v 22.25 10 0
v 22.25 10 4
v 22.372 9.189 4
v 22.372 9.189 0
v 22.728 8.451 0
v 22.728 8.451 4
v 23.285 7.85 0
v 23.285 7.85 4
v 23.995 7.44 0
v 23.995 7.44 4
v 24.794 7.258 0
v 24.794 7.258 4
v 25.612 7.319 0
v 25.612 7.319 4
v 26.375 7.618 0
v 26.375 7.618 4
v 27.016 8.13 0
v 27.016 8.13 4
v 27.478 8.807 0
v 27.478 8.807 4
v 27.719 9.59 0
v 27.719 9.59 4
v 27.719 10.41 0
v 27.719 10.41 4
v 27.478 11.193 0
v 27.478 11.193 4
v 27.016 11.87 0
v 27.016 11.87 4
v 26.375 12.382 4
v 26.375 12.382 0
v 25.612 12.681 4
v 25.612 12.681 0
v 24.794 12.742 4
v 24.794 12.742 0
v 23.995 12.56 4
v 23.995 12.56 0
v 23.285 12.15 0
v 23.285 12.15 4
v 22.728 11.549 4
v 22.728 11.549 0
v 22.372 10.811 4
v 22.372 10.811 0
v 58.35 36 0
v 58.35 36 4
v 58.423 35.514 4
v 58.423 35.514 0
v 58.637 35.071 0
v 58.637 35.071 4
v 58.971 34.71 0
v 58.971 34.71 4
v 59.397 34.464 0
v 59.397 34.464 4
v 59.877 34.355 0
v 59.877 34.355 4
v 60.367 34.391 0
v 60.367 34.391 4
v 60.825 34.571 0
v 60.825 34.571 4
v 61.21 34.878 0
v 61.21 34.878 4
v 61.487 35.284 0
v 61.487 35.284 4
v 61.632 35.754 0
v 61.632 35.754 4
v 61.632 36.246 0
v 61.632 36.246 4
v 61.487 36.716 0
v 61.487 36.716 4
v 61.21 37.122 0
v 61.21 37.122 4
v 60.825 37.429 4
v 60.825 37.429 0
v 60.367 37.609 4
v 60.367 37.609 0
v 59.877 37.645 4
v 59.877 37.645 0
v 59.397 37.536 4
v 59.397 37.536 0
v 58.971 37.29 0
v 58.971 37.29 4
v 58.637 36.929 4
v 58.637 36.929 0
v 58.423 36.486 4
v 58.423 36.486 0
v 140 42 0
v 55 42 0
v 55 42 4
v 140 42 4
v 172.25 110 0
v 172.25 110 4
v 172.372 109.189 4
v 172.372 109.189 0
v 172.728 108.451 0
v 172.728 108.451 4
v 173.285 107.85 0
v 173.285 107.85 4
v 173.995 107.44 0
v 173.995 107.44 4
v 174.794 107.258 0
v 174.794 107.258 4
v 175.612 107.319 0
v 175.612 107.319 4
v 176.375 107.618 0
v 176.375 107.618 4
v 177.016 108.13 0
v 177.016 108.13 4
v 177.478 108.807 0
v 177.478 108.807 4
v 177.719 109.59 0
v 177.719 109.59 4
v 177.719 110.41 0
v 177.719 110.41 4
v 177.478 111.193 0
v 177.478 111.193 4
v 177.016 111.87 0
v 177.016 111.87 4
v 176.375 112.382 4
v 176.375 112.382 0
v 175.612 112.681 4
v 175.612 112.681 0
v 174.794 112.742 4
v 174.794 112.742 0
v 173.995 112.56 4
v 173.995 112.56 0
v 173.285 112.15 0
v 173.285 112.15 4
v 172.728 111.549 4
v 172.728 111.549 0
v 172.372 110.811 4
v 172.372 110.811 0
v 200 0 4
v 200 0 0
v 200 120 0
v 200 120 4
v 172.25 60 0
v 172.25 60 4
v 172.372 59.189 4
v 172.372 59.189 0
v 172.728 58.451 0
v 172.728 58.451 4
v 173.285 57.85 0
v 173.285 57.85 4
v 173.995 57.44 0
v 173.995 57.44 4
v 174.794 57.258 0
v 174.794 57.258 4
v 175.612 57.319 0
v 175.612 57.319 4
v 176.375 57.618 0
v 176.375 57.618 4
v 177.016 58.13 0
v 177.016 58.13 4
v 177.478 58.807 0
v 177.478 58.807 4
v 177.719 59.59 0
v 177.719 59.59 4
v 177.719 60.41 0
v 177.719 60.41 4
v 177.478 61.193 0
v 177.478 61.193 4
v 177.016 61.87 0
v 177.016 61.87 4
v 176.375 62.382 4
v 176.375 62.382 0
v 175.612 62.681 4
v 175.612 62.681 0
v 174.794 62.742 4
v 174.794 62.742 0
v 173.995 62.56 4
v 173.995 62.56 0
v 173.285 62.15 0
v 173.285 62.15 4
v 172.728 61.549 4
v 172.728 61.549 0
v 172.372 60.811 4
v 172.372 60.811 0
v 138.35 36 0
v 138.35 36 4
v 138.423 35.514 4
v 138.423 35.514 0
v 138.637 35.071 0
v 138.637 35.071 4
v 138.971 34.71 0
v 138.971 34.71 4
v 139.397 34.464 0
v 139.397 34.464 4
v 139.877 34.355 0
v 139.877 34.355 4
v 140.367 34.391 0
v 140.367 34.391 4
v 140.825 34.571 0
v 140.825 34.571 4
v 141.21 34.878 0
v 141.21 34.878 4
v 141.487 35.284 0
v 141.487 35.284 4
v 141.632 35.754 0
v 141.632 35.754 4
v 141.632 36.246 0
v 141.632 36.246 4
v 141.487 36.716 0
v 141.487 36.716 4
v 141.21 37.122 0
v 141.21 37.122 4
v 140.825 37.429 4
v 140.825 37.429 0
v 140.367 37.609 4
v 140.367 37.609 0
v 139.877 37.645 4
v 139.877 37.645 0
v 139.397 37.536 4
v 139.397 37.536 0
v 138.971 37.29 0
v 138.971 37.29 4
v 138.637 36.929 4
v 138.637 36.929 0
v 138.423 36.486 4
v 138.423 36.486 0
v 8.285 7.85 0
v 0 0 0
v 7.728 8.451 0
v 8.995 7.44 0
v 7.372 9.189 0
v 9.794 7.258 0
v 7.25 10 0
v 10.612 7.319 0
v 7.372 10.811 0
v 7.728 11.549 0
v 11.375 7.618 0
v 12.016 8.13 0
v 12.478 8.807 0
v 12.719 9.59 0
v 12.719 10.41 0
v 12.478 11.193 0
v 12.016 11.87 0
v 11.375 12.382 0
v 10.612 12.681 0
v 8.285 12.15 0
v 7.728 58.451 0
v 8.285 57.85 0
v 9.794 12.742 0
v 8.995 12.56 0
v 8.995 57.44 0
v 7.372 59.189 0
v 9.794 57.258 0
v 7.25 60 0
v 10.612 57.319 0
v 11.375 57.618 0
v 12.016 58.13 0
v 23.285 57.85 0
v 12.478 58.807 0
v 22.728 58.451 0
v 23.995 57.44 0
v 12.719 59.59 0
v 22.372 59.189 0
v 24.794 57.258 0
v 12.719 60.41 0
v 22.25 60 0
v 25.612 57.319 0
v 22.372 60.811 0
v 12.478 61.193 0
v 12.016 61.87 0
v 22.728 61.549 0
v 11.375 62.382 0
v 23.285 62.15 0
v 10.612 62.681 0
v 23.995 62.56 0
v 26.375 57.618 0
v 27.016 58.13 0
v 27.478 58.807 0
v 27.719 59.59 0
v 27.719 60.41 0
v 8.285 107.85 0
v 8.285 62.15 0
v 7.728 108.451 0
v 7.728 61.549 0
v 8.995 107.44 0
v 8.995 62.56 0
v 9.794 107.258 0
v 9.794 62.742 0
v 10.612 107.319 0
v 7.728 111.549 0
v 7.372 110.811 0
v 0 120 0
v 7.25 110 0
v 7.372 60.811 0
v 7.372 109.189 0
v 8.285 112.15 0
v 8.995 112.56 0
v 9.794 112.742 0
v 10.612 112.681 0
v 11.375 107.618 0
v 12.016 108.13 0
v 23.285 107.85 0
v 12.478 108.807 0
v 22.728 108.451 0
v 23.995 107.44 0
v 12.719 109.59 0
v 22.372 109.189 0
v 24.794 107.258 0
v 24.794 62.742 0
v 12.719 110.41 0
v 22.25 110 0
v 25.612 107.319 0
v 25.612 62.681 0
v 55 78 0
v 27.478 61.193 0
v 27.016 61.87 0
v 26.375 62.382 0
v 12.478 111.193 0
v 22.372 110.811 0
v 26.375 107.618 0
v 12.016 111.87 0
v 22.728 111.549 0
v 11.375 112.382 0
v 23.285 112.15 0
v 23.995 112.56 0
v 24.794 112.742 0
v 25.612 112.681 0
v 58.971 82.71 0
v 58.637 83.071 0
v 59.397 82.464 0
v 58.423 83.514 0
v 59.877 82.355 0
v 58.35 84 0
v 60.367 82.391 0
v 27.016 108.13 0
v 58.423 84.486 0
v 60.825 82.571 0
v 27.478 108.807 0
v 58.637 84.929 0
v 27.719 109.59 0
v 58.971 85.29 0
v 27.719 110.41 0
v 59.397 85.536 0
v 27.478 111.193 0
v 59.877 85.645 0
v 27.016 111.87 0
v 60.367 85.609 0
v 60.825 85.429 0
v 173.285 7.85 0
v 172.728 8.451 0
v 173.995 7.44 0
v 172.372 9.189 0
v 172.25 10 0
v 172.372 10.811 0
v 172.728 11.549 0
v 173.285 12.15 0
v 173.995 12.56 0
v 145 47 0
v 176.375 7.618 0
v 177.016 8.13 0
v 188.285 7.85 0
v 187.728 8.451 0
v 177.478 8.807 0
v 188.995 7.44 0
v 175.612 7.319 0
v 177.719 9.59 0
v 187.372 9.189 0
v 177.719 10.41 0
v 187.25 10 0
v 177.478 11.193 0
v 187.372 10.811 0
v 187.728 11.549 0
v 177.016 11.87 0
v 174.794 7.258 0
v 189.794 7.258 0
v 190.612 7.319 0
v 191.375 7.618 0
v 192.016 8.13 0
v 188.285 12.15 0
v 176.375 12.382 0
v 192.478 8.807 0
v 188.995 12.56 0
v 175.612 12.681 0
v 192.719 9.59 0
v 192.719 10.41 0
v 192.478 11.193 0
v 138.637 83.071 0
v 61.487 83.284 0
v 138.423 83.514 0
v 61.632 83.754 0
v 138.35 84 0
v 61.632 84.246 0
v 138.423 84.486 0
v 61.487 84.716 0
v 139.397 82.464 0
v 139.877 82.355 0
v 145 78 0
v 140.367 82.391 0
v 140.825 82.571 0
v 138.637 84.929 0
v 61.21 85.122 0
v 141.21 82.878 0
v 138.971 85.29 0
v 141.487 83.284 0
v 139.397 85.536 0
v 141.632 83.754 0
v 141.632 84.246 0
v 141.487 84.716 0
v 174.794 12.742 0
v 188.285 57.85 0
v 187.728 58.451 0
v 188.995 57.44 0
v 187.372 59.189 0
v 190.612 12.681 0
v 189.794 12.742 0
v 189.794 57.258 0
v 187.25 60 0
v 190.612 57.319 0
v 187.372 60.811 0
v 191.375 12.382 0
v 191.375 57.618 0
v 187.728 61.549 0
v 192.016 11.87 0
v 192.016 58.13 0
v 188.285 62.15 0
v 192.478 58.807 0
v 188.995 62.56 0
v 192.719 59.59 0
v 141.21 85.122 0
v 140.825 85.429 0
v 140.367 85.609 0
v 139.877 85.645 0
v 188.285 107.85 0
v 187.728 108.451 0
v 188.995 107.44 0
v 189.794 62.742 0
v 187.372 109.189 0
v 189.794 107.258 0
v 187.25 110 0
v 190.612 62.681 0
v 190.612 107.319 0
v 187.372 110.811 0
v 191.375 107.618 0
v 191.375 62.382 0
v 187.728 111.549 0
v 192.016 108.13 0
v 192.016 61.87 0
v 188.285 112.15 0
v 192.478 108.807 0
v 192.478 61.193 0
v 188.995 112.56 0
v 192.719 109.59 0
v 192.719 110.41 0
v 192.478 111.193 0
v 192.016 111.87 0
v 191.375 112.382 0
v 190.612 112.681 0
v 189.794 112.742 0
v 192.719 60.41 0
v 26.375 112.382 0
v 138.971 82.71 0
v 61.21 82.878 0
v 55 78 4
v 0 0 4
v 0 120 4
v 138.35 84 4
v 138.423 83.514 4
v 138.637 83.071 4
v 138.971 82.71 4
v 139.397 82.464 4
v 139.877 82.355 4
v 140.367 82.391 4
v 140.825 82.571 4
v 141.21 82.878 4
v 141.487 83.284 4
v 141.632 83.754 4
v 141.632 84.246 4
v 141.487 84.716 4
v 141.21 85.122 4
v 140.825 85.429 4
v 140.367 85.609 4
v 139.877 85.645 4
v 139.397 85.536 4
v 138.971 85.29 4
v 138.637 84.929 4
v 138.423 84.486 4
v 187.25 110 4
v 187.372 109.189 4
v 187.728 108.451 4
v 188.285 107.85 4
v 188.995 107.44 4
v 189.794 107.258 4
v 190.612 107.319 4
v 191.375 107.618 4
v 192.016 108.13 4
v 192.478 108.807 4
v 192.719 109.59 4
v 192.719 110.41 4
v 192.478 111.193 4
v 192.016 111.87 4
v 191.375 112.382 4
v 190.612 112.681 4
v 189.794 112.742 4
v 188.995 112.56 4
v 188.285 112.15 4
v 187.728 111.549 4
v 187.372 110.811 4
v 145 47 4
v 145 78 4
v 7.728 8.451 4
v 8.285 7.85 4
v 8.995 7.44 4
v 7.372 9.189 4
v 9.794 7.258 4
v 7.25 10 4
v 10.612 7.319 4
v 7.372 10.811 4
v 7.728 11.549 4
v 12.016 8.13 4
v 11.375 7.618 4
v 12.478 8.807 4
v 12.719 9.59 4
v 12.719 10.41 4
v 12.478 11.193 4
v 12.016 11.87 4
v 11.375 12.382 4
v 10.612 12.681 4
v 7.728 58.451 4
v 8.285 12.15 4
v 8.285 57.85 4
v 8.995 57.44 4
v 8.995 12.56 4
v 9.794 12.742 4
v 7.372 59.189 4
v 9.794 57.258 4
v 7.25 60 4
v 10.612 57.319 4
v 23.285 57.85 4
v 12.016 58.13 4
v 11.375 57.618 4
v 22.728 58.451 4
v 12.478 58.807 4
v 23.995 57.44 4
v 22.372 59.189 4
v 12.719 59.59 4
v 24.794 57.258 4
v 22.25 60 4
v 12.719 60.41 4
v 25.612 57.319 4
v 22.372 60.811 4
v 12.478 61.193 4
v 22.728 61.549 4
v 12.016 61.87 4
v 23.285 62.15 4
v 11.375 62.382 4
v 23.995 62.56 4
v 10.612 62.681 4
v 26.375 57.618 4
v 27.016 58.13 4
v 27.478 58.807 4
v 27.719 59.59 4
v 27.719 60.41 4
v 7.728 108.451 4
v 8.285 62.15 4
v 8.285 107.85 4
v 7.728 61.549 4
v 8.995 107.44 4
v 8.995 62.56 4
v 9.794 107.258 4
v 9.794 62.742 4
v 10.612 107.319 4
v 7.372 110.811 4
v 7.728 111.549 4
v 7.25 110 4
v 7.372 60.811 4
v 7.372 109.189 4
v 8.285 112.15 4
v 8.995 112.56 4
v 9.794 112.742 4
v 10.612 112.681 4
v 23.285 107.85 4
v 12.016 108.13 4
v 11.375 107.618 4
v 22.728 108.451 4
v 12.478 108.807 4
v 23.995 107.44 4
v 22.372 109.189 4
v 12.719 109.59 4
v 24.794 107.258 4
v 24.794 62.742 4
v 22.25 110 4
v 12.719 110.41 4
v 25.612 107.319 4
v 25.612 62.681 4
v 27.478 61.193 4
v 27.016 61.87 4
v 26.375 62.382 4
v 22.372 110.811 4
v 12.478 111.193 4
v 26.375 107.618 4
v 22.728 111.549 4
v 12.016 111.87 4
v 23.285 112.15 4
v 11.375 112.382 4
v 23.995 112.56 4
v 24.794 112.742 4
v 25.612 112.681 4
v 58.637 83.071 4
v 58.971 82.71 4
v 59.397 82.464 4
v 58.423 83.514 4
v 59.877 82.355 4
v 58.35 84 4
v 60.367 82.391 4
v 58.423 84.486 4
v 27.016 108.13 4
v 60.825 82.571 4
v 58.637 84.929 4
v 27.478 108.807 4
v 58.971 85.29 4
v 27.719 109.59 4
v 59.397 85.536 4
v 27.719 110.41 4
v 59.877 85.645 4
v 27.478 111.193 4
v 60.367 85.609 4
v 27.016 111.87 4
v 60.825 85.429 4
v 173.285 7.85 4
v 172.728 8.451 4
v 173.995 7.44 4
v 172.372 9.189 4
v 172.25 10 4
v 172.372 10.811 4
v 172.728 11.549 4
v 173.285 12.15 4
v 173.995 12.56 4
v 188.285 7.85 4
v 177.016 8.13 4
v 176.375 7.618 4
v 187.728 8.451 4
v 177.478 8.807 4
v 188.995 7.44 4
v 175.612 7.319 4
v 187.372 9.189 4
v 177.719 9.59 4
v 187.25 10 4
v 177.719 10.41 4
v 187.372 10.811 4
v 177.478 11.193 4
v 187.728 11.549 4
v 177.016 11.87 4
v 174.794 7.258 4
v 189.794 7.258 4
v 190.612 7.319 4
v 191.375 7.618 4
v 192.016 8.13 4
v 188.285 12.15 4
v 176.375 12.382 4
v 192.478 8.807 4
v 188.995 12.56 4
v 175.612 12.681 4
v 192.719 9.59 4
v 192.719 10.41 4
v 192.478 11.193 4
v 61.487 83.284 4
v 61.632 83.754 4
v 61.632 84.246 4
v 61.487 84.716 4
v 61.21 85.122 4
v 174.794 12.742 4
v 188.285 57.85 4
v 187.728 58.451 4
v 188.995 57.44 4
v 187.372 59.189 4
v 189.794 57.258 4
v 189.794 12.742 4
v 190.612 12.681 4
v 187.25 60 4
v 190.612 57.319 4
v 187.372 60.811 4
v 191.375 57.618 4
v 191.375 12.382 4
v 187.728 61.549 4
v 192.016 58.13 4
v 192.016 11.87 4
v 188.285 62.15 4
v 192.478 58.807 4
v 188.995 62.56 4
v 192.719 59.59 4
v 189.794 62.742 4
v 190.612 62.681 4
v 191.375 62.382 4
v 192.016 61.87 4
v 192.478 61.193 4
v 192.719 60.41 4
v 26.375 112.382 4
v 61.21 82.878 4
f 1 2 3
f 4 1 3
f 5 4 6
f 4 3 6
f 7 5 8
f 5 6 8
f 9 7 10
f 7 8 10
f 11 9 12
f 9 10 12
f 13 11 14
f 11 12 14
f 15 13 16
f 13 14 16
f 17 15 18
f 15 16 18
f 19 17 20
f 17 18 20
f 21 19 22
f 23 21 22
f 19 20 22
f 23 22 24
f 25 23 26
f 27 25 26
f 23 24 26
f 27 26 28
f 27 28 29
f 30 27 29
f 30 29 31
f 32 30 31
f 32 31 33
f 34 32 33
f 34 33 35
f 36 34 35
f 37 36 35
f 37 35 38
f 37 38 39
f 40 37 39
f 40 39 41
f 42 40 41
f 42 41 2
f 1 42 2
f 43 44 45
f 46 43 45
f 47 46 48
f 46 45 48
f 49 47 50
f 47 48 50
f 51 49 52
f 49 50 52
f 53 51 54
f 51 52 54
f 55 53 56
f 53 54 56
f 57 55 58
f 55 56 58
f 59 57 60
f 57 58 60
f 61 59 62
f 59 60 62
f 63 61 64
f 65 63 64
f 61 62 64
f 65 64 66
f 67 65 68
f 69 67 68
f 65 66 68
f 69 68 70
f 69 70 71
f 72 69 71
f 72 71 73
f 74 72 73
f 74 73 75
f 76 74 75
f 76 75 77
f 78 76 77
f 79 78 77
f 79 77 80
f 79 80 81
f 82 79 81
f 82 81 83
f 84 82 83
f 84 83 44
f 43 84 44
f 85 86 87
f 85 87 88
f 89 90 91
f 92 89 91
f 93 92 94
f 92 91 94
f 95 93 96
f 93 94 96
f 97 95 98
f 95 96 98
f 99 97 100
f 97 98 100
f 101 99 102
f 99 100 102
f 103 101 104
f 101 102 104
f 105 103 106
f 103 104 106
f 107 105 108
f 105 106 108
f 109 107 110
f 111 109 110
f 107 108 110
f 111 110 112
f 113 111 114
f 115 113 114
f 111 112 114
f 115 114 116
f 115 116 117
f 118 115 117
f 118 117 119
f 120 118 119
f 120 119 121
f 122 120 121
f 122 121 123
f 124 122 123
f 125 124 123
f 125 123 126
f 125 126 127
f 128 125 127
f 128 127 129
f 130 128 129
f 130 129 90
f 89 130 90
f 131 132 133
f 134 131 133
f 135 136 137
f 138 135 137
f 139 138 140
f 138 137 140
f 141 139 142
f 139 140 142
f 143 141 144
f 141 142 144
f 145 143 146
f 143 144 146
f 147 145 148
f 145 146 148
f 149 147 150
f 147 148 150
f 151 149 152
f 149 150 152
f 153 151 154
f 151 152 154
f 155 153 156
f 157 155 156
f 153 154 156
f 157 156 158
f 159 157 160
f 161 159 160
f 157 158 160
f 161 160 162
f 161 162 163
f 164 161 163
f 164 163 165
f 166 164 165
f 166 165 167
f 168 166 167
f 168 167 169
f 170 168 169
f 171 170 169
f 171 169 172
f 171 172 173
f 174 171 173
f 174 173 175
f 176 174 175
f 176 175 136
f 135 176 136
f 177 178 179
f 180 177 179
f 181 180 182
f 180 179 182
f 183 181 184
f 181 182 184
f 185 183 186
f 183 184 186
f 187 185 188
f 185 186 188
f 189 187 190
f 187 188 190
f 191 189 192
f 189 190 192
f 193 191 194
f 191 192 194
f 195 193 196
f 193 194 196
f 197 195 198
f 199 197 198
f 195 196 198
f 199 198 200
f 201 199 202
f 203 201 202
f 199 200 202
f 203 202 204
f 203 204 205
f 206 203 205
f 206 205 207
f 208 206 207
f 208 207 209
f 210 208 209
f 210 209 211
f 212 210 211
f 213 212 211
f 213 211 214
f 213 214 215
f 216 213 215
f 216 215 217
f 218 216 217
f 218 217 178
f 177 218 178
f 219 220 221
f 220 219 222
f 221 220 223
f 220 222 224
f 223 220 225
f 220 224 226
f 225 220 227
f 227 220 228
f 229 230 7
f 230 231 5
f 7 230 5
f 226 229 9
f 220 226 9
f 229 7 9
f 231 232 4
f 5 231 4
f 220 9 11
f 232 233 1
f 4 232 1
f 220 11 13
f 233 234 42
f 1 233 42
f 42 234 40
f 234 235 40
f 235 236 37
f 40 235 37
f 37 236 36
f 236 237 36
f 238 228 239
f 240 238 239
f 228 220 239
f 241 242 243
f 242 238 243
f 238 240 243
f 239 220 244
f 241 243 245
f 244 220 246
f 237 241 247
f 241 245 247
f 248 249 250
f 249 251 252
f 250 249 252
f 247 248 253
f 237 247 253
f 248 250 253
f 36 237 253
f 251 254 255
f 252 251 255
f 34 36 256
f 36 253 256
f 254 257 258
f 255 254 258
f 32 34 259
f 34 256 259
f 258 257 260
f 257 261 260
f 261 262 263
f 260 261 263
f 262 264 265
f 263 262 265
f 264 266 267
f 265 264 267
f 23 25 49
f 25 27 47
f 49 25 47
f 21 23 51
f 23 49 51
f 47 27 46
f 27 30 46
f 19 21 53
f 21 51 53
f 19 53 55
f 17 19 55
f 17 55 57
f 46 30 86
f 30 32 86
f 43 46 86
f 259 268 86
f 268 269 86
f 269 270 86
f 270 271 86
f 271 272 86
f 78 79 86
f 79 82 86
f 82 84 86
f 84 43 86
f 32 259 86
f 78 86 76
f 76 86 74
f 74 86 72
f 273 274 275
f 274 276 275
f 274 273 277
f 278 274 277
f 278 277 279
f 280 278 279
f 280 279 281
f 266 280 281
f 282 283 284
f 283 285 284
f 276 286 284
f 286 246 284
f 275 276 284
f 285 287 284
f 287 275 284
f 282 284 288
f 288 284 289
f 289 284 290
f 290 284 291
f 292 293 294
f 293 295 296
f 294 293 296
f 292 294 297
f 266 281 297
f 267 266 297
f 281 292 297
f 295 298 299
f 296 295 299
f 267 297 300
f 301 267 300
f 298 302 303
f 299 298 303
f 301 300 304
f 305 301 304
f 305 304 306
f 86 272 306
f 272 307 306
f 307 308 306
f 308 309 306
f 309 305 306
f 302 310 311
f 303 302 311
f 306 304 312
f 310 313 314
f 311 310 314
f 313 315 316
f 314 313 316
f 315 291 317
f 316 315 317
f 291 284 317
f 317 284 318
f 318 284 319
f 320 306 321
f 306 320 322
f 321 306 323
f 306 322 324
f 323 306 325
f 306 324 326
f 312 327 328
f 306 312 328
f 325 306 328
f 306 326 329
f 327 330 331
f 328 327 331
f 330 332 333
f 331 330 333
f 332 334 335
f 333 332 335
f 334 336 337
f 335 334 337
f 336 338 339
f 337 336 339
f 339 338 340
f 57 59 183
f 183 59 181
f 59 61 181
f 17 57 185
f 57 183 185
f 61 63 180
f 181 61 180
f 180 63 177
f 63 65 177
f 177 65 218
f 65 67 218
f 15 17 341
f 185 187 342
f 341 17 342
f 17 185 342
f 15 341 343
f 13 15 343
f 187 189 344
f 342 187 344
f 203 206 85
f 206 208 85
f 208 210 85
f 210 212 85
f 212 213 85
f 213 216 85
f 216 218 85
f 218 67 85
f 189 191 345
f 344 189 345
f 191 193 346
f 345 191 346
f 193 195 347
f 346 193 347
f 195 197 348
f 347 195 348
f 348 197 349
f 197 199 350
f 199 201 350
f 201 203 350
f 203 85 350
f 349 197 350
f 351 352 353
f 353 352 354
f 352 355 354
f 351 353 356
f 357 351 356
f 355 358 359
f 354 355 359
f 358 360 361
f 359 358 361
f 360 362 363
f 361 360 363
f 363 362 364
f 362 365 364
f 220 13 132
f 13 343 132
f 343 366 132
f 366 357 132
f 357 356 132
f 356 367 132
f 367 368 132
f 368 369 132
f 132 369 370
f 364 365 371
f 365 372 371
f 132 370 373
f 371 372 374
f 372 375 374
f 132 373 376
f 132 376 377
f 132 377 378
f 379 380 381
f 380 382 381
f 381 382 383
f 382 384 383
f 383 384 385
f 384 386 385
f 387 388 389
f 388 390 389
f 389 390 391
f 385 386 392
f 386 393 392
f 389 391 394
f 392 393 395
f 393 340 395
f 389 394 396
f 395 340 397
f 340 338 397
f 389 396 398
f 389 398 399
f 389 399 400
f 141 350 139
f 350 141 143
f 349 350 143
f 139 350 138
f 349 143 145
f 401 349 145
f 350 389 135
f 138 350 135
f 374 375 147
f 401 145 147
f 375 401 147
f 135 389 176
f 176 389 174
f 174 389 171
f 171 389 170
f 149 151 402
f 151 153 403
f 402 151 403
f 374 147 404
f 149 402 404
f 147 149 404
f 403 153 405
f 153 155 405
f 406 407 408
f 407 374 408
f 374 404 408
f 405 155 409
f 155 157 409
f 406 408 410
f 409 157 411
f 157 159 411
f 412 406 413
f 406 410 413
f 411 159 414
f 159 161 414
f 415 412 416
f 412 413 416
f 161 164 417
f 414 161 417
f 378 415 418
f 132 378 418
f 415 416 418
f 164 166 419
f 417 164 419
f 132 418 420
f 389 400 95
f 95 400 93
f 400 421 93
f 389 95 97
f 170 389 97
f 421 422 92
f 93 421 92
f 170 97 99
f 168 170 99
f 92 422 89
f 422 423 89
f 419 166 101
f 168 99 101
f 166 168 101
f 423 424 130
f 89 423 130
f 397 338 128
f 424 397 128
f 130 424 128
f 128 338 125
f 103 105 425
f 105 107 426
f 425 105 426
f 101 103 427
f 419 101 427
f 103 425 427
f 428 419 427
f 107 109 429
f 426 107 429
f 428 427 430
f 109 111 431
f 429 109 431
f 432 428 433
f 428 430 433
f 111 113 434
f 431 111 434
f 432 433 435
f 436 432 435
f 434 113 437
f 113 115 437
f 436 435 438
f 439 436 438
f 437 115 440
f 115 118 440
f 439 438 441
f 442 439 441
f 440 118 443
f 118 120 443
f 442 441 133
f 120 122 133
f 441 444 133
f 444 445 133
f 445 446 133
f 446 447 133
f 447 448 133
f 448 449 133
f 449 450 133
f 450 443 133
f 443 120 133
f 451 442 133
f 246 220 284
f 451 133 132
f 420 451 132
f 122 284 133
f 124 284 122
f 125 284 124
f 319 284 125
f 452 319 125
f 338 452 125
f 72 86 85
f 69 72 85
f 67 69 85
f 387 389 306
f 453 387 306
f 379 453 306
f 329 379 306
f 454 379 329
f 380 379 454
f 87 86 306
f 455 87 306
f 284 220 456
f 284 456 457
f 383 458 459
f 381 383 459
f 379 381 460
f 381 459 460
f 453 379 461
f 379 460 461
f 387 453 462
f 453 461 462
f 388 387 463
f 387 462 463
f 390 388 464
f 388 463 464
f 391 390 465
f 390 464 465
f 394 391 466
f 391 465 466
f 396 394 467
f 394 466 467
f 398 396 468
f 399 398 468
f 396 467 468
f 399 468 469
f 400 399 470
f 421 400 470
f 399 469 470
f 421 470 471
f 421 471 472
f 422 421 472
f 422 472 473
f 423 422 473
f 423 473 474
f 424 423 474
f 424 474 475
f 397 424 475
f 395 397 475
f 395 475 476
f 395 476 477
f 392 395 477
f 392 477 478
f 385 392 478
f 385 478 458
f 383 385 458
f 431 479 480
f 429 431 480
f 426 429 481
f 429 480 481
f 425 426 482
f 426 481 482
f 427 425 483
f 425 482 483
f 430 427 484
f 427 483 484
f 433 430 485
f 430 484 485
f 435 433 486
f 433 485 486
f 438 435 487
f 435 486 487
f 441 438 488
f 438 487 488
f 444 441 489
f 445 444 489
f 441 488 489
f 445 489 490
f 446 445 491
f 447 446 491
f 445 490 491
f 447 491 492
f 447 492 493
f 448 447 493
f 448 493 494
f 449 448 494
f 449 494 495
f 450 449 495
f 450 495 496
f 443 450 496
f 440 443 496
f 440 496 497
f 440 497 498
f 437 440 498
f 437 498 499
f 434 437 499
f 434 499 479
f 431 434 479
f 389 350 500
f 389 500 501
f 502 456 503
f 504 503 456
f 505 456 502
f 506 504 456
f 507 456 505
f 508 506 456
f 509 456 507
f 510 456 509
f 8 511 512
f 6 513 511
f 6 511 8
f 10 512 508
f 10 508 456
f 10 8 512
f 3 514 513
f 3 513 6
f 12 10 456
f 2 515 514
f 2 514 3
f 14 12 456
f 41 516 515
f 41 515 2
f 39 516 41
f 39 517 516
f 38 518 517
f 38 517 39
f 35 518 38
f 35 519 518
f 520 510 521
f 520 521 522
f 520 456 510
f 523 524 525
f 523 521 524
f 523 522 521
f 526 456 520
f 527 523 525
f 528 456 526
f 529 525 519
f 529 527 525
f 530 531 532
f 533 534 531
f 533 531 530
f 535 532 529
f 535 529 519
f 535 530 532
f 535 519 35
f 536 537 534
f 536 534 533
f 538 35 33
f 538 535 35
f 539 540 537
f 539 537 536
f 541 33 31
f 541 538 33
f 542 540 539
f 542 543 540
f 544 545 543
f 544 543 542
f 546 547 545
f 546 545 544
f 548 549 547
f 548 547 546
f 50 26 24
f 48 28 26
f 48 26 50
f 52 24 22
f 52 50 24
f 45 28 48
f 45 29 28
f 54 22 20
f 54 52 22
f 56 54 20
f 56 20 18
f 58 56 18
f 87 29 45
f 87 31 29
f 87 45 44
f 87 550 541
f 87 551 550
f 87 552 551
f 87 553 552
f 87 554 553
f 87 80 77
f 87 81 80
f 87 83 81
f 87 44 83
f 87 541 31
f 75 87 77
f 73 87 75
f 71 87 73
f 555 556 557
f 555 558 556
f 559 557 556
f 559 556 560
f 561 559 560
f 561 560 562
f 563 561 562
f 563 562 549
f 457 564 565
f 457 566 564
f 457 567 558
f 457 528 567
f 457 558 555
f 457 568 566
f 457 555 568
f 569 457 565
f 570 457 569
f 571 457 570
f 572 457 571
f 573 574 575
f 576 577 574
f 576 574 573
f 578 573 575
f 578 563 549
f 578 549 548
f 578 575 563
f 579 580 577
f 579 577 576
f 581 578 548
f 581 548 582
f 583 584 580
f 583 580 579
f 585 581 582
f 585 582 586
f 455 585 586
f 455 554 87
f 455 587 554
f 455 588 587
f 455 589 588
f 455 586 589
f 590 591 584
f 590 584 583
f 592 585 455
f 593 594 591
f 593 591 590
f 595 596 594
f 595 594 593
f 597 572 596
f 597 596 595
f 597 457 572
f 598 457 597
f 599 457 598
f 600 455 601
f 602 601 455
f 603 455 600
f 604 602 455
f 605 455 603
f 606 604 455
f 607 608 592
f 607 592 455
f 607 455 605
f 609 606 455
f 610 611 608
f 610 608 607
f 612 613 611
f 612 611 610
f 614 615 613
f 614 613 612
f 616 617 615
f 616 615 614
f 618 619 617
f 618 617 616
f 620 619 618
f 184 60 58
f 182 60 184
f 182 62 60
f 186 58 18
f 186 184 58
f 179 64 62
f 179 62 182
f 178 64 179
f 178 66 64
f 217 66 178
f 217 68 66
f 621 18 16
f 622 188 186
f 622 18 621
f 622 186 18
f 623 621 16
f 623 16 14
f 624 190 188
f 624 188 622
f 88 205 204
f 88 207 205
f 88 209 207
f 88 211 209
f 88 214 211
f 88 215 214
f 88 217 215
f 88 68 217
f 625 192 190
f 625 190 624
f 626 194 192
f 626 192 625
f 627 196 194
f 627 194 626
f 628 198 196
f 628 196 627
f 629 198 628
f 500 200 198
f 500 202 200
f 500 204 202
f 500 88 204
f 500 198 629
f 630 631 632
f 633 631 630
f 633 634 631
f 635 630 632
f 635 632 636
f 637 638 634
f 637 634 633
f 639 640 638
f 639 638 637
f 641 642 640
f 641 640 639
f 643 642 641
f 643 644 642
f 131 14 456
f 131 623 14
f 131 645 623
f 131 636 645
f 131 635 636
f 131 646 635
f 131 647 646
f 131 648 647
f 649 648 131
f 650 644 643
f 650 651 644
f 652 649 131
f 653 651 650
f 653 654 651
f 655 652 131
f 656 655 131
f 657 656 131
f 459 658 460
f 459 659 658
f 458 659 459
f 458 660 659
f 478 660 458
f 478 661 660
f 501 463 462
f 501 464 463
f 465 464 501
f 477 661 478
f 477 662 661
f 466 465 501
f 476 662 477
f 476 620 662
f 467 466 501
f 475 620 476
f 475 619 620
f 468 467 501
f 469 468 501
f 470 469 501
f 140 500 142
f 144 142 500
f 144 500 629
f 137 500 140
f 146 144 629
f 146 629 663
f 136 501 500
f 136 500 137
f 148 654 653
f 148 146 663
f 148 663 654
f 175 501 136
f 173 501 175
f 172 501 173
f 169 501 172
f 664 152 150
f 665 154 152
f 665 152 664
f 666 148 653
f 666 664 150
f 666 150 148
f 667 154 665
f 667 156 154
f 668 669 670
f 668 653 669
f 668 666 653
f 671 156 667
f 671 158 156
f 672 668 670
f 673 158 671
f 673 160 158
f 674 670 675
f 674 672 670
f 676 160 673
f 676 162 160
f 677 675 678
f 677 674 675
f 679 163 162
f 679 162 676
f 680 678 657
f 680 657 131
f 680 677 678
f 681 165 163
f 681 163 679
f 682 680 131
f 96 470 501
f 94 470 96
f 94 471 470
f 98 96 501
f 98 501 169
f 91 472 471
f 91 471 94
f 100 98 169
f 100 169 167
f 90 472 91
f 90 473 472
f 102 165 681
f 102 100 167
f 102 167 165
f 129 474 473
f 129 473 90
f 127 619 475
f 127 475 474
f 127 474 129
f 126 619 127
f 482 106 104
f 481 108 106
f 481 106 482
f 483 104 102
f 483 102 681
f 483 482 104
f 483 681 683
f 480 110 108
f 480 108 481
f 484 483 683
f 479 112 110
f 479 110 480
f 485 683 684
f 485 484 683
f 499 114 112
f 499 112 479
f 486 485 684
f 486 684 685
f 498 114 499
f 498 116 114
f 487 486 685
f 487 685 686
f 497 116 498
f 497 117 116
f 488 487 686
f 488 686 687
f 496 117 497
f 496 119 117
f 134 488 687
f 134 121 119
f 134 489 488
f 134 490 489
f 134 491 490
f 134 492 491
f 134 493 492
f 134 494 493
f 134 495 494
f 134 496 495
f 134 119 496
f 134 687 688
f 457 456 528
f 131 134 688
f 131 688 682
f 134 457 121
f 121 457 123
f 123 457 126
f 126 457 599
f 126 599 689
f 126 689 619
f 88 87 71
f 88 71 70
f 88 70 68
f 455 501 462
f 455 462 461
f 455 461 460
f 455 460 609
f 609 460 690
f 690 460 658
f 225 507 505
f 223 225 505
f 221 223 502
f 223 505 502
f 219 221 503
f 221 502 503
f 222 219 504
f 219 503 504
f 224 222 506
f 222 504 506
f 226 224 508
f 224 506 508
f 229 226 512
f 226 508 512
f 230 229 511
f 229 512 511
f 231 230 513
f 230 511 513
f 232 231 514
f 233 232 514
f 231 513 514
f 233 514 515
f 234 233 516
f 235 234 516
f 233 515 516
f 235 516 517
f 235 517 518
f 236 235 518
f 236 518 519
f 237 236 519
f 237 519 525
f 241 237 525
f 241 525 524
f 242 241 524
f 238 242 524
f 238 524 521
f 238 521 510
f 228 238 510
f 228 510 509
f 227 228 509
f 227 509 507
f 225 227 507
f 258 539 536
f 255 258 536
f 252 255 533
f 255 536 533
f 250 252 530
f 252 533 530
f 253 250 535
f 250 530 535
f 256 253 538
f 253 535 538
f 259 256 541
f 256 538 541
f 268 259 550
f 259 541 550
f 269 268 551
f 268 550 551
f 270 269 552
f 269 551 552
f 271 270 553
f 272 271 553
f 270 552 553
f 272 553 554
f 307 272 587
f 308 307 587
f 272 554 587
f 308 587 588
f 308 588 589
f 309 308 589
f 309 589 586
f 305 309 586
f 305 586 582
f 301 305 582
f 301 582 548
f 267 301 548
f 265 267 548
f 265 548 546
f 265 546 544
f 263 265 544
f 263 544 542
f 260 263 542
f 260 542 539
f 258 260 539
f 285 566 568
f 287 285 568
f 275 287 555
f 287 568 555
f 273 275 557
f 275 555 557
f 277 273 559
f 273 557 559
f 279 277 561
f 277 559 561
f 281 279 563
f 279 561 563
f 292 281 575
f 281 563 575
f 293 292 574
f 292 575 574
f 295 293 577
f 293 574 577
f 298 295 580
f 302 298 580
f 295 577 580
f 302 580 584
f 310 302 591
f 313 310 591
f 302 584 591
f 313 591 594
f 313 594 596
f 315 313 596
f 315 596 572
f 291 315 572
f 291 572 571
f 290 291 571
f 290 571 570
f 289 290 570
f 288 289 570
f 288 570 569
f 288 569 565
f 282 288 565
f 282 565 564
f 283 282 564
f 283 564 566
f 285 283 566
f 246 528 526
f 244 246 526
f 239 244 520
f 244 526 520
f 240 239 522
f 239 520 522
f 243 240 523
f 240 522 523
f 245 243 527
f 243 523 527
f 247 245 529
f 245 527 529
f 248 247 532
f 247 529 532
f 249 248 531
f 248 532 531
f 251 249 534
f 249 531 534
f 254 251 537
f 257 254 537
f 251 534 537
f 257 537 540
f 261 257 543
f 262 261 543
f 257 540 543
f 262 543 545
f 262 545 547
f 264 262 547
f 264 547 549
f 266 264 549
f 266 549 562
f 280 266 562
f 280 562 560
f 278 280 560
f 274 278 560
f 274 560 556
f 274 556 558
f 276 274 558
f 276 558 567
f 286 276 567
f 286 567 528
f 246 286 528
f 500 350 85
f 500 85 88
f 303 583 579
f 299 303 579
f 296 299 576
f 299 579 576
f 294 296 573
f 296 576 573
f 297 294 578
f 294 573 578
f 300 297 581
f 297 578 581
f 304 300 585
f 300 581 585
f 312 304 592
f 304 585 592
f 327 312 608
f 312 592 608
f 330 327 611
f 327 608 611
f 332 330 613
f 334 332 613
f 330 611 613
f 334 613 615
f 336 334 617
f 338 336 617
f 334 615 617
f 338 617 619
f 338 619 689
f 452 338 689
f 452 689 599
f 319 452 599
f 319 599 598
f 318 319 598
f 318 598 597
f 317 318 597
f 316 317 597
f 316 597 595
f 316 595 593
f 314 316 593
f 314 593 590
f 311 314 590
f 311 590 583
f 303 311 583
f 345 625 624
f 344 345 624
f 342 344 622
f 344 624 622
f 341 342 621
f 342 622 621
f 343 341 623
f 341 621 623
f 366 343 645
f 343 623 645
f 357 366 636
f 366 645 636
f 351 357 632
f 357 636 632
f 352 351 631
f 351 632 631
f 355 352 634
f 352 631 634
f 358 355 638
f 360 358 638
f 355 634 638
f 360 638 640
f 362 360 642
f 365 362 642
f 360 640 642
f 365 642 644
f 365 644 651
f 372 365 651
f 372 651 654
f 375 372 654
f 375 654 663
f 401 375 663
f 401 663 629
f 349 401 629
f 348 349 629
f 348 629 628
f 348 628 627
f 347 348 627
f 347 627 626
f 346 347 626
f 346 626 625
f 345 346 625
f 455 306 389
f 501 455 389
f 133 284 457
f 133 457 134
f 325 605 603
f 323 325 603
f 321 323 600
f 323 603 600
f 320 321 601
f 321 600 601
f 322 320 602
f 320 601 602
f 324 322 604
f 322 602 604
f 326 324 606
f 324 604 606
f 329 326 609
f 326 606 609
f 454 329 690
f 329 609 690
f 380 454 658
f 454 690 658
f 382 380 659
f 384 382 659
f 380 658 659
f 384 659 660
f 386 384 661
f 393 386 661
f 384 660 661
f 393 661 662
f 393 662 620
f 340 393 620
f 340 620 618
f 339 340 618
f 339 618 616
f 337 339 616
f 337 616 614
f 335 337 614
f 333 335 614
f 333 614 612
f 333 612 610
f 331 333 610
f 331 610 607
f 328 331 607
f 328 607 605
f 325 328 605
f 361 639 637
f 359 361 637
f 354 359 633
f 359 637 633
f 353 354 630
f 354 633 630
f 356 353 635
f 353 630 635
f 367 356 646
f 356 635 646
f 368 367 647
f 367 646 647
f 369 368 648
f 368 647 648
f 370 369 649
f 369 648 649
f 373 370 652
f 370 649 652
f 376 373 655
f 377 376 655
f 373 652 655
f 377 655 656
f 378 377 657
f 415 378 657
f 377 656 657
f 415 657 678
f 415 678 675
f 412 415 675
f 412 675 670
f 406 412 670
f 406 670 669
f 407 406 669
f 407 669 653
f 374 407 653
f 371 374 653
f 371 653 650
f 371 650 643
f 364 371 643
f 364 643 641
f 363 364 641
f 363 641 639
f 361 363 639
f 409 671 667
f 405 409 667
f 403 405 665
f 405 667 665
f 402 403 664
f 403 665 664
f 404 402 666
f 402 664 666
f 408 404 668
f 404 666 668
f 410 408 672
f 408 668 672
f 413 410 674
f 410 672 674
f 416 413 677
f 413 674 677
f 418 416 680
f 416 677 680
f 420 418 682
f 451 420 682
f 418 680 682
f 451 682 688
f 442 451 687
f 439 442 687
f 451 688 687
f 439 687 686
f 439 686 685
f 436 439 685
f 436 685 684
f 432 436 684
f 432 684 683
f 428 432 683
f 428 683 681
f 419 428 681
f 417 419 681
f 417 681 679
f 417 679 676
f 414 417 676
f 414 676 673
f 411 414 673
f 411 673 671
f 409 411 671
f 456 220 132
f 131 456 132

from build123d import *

# Parameters (mm, degrees)
F1_W     = 200
F1_H     = 120
F2_DEPTH = 4
F3_W     = 90
F3_H     = 36
F4_DEPTH = 4
F5_SIZE  = 5
F7_D     = 3.3
F9_D     = 5.5


with BuildPart() as f2:
    # F1 (on Top) → F2 (new body)
    with BuildSketch(Plane.XY):
        with Locations((100, 60)):
            Rectangle(F1_W, F1_H)
    extrude(amount=F2_DEPTH)

    # F3 (on Top) → F4 (cut, through all)
    with BuildSketch(Plane.XY):
        with Locations((100, 60)):
            Rectangle(F3_W, F3_H)
    extrude(amount=F4_DEPTH, mode=Mode.SUBTRACT)

    # F5
    f5_edges = [f2.edges().sort_by_distance(p)[0] for p in [
        (145, 42, 2),
    ]]
    chamfer(f5_edges, length=F5_SIZE)

    # F7 (through all)
    with Locations(Plane(origin=(0, 0, 0), x_dir=(1, 0, 0), z_dir=(0, 0, -1))):
        with Locations((140, -84), (140, -36), (60, -36), (60, -84)):
            Hole(F7_D / 2)

    # F9 (through all)
    with Locations(Plane(origin=(0, 0, 0), x_dir=(1, 0, 0), z_dir=(0, 0, -1))):
        with Locations((25, -110), (25, -60), (25, -10), (175, -110), (175, -60), (175, -10), (10, -110), (10, -60), (10, -10), (190, -110), (190, -60), (190, -10)):
            Hole(F9_D / 2)


solid = f2.part
